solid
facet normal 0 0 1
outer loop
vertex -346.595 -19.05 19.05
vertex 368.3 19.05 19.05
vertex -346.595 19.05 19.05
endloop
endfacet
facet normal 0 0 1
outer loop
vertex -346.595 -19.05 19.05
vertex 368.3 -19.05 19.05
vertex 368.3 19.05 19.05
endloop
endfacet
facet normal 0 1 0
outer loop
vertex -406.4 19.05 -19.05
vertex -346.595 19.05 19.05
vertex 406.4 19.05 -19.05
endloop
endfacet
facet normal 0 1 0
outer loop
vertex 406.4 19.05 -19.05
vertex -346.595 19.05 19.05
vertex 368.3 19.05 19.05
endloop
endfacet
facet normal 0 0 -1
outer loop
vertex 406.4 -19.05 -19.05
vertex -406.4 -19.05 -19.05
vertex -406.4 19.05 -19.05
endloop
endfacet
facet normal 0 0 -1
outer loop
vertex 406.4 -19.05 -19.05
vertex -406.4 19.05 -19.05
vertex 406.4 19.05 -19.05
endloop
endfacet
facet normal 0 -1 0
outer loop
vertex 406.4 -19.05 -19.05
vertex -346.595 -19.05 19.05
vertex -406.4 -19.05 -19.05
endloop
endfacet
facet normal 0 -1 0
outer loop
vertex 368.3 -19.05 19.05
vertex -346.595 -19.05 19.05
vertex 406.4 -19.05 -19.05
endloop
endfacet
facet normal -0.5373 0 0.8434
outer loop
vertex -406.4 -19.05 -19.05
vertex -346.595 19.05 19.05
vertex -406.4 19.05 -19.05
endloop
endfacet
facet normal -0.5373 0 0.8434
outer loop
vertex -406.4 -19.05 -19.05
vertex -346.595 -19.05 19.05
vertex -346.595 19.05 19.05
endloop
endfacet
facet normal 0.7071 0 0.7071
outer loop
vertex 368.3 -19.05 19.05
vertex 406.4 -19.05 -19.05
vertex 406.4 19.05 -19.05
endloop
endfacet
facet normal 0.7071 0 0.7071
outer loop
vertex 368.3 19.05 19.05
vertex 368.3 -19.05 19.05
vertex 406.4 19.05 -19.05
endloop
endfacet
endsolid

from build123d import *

# Parameters (mm, degrees)
F1_DEPTH = 19.05
F2_SIZE  = 38.09999


# Not quite as in the source:
# - a fillet or chamfer is up to 0.001 mm smaller than in the source, because OpenCascade refuses the exact size


with BuildPart() as f1:
    # F0 (on Front) → F1 (new body, symmetric)
    with BuildSketch(Plane.XZ):
        Polygon((-346.5949795118, 19.05), (-406.4, -19.05), (406.4, -19.05), (406.4, 19.05), align=None)
    extrude(amount=F1_DEPTH, both=True)

    # F2 (size 38.1 in the source; OpenCascade refuses exactly that, so slightly less here)
    f2_edges = [f1.edges().sort_by_distance(p)[0] for p in [
        (406.4, 0, 19.05),
    ]]
    chamfer(f2_edges, length=F2_SIZE)


solid = f1.part
